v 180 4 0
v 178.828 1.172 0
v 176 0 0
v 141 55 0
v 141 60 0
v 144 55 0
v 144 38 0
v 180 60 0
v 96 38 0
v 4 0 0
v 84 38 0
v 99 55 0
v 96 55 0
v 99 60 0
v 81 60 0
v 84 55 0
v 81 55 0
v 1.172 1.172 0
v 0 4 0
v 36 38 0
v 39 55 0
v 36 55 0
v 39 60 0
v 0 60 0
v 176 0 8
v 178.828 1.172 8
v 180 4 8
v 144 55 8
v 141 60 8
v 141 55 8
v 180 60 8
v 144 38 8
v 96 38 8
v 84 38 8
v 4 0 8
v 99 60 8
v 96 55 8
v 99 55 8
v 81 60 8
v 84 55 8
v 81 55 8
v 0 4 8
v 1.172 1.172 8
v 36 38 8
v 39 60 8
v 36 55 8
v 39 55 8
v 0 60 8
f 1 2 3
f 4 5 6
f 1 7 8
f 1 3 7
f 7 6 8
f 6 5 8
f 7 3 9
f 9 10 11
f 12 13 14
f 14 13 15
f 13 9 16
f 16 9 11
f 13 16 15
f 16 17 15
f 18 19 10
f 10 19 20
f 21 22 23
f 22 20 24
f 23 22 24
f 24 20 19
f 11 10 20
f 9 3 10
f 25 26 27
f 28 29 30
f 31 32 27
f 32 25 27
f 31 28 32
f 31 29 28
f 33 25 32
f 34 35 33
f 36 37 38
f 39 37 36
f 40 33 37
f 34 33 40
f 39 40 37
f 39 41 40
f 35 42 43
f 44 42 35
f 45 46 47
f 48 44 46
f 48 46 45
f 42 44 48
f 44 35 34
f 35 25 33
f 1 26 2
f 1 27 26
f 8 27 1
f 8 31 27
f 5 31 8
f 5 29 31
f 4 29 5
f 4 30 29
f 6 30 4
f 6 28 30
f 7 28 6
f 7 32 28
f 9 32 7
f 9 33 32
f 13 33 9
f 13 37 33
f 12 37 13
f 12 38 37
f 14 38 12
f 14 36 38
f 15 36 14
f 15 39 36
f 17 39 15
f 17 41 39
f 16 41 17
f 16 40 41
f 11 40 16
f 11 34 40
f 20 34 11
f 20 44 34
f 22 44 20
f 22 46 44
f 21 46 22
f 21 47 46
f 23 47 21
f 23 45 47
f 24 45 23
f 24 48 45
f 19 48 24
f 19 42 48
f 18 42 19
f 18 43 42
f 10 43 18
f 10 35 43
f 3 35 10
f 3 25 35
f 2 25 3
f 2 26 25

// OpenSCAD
$fn = 32;

// ----------------------------------------------------------------------
// Oversize slot bar: 180 mm bar with 2 oversize windows
// ----------------------------------------------------------------------

// --- parameters (mm) ---
profile_height = 8;       // extrusion height
profile_points = 24;      // points of the closed outline

profile = [[0, 4], [1.172, 1.172], [4, 0], [176, 0], [178.828, 1.172], [180, 4], [180, 60], [141, 60], [141, 55], [144, 55], [144, 38], [96, 38], [96, 55], [99, 55], [99, 60], [81, 60], [81, 55], [84, 55], [84, 38], [36, 38], [36, 55], [39, 55], [39, 60], [0, 60]];  // single closed polygon, 24 points, counter clockwise

// --- the one profile operation ---
linear_extrude(height = profile_height) polygon(points = profile);
